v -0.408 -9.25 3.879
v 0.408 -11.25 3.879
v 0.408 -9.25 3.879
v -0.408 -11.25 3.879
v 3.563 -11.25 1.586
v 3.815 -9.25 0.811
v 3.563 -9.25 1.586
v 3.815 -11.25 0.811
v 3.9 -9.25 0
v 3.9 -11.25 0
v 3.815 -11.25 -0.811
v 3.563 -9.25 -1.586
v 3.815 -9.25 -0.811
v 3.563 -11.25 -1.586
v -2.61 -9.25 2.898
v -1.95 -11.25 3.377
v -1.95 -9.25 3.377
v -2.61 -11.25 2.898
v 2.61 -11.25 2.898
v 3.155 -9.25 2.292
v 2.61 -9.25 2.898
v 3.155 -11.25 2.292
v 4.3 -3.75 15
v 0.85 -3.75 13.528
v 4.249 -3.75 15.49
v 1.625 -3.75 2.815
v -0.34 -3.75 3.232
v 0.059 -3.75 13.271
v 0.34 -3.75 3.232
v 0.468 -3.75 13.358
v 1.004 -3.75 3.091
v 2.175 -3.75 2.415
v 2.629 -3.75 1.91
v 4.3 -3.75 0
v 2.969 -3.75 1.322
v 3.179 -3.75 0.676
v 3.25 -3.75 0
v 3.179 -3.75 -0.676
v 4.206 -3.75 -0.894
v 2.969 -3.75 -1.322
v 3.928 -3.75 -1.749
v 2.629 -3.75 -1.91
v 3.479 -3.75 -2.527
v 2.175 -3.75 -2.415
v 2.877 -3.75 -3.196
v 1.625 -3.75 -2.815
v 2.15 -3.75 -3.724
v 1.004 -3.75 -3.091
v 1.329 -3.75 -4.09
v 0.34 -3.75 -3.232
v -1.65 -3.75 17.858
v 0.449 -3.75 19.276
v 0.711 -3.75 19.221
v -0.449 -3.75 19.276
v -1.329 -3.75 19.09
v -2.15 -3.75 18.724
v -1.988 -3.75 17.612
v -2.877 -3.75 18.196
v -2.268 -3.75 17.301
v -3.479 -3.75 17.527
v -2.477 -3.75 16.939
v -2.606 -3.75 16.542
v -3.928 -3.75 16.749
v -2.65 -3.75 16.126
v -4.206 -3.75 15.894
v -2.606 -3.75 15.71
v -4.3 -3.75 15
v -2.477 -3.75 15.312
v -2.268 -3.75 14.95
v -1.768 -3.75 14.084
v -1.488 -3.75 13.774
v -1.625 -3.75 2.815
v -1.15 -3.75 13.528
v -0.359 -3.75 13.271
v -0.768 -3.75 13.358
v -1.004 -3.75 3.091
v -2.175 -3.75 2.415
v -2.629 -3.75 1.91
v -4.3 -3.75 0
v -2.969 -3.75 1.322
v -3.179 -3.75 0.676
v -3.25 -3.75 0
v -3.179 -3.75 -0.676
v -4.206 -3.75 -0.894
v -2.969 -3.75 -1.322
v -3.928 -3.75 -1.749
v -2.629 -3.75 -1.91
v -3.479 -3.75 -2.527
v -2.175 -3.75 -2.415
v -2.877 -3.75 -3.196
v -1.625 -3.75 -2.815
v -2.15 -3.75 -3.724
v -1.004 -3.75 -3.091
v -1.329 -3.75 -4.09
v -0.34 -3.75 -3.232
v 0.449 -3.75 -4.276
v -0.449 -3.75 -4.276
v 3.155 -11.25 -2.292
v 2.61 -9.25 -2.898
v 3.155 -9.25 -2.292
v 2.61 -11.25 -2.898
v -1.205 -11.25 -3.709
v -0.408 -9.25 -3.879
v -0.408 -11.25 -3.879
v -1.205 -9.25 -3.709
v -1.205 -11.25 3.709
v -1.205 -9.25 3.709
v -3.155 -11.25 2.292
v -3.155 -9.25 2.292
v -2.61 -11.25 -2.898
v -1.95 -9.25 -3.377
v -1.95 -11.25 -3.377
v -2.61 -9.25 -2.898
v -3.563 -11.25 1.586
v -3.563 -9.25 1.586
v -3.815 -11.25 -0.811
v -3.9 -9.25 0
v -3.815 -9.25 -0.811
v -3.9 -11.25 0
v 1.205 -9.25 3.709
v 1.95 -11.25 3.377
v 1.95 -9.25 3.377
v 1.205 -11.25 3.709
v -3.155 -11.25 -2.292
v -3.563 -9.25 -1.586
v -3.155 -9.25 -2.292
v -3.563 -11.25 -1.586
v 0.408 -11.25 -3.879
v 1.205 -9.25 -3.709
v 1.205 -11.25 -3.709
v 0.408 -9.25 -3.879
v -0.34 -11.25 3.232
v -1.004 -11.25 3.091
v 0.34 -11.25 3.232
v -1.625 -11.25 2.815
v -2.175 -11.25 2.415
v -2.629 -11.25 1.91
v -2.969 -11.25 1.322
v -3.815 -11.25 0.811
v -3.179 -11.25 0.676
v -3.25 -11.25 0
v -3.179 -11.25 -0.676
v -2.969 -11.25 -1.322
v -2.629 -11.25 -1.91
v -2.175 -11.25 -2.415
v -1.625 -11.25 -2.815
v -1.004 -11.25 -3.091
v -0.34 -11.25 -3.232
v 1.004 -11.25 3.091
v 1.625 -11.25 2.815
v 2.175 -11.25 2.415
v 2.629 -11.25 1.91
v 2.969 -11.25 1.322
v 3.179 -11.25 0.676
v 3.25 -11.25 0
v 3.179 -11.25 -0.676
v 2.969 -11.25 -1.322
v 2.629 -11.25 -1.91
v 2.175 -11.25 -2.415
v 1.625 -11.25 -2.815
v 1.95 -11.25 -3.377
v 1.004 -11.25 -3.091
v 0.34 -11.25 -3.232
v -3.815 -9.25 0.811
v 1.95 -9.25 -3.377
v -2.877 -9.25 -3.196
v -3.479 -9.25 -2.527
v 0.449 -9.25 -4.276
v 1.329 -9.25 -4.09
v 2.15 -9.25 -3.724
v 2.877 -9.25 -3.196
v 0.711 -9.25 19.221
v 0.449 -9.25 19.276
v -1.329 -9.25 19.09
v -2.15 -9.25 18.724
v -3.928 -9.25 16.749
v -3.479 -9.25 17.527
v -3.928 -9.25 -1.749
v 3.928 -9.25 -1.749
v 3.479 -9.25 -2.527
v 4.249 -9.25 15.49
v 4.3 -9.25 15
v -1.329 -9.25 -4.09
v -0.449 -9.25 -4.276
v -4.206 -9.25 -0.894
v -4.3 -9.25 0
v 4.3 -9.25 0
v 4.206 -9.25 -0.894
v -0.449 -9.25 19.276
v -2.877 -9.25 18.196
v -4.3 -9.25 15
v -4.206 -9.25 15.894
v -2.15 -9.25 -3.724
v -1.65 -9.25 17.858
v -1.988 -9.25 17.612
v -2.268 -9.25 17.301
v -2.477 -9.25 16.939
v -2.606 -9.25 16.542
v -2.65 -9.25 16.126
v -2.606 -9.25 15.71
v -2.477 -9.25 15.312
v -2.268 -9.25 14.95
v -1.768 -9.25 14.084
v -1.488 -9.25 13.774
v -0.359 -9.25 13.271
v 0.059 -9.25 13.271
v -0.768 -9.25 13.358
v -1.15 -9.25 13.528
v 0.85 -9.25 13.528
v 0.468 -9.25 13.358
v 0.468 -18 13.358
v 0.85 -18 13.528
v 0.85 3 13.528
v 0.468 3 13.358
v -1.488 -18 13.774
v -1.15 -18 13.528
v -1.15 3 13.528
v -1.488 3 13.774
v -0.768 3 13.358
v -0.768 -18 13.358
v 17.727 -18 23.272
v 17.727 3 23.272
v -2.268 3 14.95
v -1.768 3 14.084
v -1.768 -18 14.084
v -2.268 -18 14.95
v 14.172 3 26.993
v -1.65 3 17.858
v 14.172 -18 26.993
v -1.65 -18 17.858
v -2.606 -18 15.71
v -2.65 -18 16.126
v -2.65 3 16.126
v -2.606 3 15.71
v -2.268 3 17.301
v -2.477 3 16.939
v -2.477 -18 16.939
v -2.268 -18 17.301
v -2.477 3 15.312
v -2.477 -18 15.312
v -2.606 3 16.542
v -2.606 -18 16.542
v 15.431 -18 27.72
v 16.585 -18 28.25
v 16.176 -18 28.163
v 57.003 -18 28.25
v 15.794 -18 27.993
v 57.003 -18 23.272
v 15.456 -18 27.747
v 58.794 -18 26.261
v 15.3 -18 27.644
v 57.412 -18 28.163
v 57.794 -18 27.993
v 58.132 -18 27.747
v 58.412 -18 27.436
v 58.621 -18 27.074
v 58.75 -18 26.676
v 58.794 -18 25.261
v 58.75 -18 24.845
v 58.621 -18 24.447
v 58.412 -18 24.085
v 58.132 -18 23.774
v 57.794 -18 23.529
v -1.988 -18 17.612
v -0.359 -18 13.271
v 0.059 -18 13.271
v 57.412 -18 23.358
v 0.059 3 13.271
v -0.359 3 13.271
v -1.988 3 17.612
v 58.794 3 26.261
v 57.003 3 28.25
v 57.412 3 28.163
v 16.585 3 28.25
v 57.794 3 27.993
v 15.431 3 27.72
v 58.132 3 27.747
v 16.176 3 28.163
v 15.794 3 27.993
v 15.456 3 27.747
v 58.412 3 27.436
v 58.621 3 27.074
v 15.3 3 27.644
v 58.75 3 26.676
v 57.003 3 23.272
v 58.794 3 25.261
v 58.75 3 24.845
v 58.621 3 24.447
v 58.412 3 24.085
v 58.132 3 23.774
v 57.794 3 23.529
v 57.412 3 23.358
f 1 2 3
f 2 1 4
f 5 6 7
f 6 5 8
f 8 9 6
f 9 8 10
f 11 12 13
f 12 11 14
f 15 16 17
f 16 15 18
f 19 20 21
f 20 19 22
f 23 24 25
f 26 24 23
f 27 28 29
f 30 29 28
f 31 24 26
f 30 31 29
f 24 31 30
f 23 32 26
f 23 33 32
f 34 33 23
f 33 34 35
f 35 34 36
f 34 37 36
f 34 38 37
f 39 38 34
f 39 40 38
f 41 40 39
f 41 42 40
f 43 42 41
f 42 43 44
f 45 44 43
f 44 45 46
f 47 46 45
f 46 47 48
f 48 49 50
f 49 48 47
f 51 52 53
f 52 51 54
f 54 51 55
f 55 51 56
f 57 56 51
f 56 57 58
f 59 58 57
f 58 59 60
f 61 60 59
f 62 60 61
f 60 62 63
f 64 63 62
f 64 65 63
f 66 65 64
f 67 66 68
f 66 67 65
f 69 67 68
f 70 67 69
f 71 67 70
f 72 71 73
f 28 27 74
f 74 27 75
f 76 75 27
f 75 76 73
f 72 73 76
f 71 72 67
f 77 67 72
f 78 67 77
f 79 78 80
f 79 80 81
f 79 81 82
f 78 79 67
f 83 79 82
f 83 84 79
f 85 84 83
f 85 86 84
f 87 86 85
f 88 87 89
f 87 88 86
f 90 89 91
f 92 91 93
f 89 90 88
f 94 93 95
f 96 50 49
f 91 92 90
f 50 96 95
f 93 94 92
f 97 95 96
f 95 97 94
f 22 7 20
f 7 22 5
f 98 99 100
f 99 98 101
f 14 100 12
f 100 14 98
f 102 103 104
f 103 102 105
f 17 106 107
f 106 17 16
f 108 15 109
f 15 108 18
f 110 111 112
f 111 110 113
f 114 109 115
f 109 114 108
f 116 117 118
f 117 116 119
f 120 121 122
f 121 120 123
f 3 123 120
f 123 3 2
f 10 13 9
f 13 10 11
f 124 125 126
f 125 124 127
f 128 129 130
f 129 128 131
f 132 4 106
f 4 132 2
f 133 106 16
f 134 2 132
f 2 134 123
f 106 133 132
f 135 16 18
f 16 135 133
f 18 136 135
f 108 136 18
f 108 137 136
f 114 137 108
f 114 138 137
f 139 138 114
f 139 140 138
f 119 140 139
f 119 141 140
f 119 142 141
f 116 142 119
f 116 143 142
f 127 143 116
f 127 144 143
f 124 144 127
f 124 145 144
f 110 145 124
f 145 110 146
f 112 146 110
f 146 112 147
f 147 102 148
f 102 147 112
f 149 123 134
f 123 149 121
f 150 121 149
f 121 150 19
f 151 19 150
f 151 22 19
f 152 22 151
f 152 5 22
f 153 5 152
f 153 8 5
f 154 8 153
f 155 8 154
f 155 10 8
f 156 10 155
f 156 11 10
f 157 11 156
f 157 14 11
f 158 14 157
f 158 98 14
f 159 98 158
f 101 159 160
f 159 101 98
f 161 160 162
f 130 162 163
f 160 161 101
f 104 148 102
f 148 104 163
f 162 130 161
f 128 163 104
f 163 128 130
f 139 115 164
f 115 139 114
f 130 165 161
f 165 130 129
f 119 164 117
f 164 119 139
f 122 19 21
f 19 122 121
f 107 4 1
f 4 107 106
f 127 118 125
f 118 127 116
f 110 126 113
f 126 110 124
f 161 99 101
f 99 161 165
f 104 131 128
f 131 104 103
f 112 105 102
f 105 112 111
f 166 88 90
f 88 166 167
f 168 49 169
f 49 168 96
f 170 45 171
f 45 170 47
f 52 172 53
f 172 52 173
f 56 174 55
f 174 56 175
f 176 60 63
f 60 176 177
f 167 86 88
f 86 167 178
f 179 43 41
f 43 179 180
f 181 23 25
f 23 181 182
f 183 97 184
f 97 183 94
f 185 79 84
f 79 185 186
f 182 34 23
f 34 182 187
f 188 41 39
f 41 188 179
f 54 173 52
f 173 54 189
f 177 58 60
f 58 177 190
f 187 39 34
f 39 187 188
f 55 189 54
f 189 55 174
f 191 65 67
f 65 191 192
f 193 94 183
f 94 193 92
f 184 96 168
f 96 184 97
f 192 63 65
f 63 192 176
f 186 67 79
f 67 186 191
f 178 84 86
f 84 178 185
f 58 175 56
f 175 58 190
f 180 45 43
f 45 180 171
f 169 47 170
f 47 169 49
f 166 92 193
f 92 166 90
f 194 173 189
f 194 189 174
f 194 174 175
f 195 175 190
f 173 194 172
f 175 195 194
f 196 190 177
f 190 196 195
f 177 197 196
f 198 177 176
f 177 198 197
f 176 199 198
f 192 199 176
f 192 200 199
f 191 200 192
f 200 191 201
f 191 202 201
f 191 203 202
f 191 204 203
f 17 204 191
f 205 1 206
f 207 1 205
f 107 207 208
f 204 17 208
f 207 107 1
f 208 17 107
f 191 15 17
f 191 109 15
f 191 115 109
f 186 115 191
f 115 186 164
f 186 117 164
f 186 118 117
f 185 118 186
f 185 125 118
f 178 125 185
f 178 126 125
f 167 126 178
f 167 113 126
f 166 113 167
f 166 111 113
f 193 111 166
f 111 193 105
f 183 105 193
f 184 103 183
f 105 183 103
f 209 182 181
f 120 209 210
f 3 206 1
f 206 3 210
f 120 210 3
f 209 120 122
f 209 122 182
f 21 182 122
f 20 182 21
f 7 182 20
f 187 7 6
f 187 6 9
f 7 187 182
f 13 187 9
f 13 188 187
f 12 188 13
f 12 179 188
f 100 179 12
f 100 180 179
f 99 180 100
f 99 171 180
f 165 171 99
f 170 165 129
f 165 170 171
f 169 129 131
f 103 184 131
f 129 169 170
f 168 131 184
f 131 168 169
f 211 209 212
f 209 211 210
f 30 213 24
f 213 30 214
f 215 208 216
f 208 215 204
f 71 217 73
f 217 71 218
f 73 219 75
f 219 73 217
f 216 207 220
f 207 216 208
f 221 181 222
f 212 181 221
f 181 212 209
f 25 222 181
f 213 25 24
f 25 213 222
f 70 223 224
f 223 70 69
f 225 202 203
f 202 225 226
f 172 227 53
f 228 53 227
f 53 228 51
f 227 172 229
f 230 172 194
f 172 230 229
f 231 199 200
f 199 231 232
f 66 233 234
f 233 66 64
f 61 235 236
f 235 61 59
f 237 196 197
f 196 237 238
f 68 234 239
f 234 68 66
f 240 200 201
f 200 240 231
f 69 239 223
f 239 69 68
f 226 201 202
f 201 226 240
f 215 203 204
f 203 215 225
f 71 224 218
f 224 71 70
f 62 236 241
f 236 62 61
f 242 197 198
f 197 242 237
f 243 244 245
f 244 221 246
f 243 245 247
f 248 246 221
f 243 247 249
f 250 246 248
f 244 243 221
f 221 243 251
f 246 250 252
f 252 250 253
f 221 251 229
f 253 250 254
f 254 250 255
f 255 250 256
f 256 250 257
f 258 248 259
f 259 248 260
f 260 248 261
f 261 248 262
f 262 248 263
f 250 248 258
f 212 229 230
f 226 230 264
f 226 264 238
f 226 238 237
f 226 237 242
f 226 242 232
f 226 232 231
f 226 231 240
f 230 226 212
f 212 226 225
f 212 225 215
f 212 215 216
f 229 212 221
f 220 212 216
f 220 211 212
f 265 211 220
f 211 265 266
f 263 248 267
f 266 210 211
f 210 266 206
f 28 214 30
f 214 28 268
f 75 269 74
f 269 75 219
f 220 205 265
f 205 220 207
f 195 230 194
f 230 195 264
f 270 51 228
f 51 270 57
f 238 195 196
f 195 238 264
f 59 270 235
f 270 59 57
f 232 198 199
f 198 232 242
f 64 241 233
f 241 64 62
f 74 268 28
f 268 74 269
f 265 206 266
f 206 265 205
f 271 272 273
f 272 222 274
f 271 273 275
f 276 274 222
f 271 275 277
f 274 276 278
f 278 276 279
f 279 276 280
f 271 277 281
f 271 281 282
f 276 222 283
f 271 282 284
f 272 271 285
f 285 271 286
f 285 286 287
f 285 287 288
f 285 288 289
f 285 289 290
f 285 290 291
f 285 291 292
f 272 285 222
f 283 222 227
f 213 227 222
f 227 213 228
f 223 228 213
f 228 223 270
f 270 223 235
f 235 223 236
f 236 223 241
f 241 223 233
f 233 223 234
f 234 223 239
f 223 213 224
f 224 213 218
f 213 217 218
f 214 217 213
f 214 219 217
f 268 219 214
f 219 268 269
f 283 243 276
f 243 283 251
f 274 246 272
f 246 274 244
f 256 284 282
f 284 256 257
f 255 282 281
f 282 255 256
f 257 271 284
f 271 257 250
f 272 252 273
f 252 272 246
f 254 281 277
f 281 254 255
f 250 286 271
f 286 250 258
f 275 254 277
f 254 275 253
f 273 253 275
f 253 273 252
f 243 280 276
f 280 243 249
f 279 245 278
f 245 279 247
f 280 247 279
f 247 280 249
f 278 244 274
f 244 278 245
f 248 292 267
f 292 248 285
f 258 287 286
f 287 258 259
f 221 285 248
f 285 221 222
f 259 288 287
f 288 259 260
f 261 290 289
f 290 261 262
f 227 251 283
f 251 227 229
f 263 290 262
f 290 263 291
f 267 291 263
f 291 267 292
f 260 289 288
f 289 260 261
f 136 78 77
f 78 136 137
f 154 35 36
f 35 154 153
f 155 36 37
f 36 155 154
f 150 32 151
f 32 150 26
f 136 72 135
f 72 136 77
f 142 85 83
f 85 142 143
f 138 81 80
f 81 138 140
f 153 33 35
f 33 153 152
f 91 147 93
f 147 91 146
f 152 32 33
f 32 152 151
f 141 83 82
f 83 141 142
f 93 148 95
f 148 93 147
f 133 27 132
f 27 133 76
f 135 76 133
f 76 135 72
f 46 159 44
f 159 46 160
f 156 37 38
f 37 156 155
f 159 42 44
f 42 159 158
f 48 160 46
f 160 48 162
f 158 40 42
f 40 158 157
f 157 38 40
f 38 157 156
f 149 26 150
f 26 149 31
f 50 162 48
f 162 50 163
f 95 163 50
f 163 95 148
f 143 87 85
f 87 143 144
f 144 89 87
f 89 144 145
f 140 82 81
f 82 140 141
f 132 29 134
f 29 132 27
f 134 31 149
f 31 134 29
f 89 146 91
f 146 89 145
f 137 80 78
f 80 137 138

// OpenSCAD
// file: ../parameters.scad
maximum_printable_size = 150;

layer_thickness = 0.3;
global_clearance = 0.5;


//Screw diameter and nut for M10 [mm]
M10_screw_diameter = 10.4;
M10_head_height = 10;
M10_head_diameter = 16+0.5;
M10_nut_height = 10.5;
M10_nut_diameter = 25.5;
M10_nut_pocket = 22.3;

//Screw diameter for M8 [mm]
M8_screw_diameter = 8.6;
M8_head_height = 8;
M8_head_diameter = 13.5;
M8_nut_height = 7.5;
M8_square_nut_thin_height = 4.5;
M8_nut_diameter = 14.4 + 0.5;
M8_nut_pocket = 13 + 0.5;
M8_washer_diameter = 16;
M8_washer_thickness = 1.5;


//Screw diameter and nut for M6 [mm]
M6_screw_diameter=6.5;
M6_head_diameter = 10+0.5;
M6_head_height = 6;
M6_nut_height = 4.9;
M6_nut_diameter = 11.8;
M6_nut_pocket = 10.4;
M6_square_nut_height = 3;
M6_square_nut_diameter = 10;
M6_washer_thickness = 1.6;

//Screw diameter and nut for M5 [mm]
M5_screw_diameter=5.5;
M5_head_height = 5;
M5_head_diameter = 13+0.5;
M5_nut_height = 4.5;
M5_nut_diameter = 9.4;
M5_nut_pocket = 8.4;

//Screw diameter and nut for M4 [mm]
M4_screw_diameter=4.5;
M4_screw_head_height = 4;
M4_nut_height = 3.2;
M4_nut_diameter = 8.4;
M4_nut_pocket = 7.5;

//Screw diameter and nut for M3 [mm]
M3_screw_diameter = 3.2;
M3_nut_height = 2.7;
M3_nut_diameter = 6.6;
M3_nut_pocket = 5.6;
M3_screw_head_height = 3;

//Screw diameter and nut for M2,5 [mm]
M2_5_screw_diameter = 2.7;
M2_5_nut_height = 2.3;
M2_5_nut_diameter = 6;
M2_5_nut_pocket = 5.5;

// kulove lozisko

bearing_efsm_08_h = 33+1;
bearing_efsm_08_m = 22;
bearing_efsm_08_db = 18;
bearing_efsm_08_ag = 10.5;
bearing_efsm_08_n = M4_screw_diameter;
bearing_efsm_08_a1 = 5.5;
bearing_efsm_08_d = 8.25;
bearing_efsm_08_B = 8; // ball height

bearing_efsm_10_h = 38+1;
bearing_efsm_10_m = 26;
bearing_efsm_10_db = 21.9;
bearing_efsm_10_ag = 12+0.2;
bearing_efsm_10_n = M5_screw_diameter;
bearing_efsm_10_a1 = 6.5;
bearing_efsm_10_d = 10.25;


bearing_efsm_12_width = 40+1;
bearing_efsm_12_h = bearing_efsm_12_width;
bearing_efsm_12_boltd = 28/2; // polovina vzdalenosti mezi srouby
bearing_efsm_12_m = bearing_efsm_12_boltd*2;
bearing_efsm_12_db = 25;
bearing_efsm_12_ag = 13;
bearing_efsm_12_a1 = 7;
bearing_efsm_12_n = M5_screw_diameter;
bearing_efsm_12_d = 12.15;
bearing_efsm_12_B = 10; // ball height
bearing_efsm_space = 1;

bearing_efsm_17_width = 54+1;
bearing_efsm_17_h = bearing_efsm_17_width;
bearing_efsm_17_boltd = 38/2; // polovina vzdalenosti mezi srouby
bearing_efsm_17_m = bearing_efsm_17_boltd*2;
bearing_efsm_17_db = 35;
bearing_efsm_17_ag = 18;
bearing_efsm_17_n = M6_screw_diameter;
bearing_efsm_17_a1 = 10;
bearing_efsm_17_B = 17; // ball height

//limcove lozisko
bearing_EFOM_10_L=26; //celkova sirka zakladny
bearing_EFOM_10_d1=10.3;//diametr otvoru real=10 mm
bearing_EFOM_10_dB=22;//diametr vystupku pro ulozeni lozika
bearing_EFOM_10_H=52;//celková delka zakladny
bearing_EFOM_10_J=36;// hole pitch
bearing_EFOM_10_A1=6.5;//vyska pouzdra
bearing_EFOM_10_Ag=12;//celkova vyska
bearing_EFOM_10_N1=5;//sirka otvoru pro sroub
bearing_EFOM_10_N2=8;//delka otvoru pro sroub
bearing_EFOM_10_m=36;//roztec der pro sroub
bearing_EFOM_10_h=9;//vyska lozika


608_bearing_outer_diameter = 22.3;
608_bearing_inner_diameter = 16;
608_bearing_thickness = 7.1;


// 20 KG servo parameters

servo_20kg_axis_offset = 9.375; // jak je osa mimo stredu
servo_20kg_body_x = 42;
servo_20kg_body_y = 21;
servo_20kg_body_z = 40;
servo_20kg_thread_x = 49/2;
servo_20kg_thread_y = 10/2;
servo_20kg_body_below = 10; // jak hluboko je tělo serva pod drzaky na srouby
servo_20kg_below = 25.8; // jak hluboko je páka serva pod drzaky na srouby

servo_20kg_bolt_d = 2.5+0.3;
servo_20kg_nut_d = 5+0.3;


//strain gauge
strain_gauge_width = 12.7;
strain_gauge_length = 75.1;
strain_gauge_screw_distance = 10;

//ALU profile
ALU_profile_width = 30.5;
ALU_profile_holder_wall_thickness = 3;
ALU_profile_groove_width = 8;

//pillow block bearing
//https://www.igus.eu/product/372
//Part no. KSTM-08
KSTM08_screws_distance = 33;         //m
KSTM08_screws_holes_diameter = 4.5;  //d2
KSTM08_flange_thickness = 6;         //h3
KSTM08_case_width = 9;               //C1
KSTM08_case_length = 47;             //a
KSTM08_ball_width = 12;              //B
KSTM08_ball_hole_diameter = 7.85;    //d1


//ložiska pro malý rotor
bearing_outer_diameter = 10.2;    // Rozměr B1 v nákresu s přídavkem na toleranci otvoru
bearing_thickness = 4;        // Rozměr B2 v nákresu
//bearing_shaft_length = 19.5;    // Rozměr B3 v nákresu, Originalni hodnota 19.5
bearing_shaft_length = 20;    // Rozměr B3 v nákresu


//simple platform parameters ////////////////////////////////////////////
front_holder_width = 160;
front_holder_angle = 25;
front_holder_height = 60;
front_holder_offset = 15;
front_holder_height_offset = 75;

// lock moving servo parameters
// static par.
servo_length = 23.1;
servo_width = 12.1;
servo_height = 26.7;
servo_axle_offset = 2.5;
servo_axle_height = 5;
servo_movement_angle = 40;
servo_movement_angle_offset = -10; // angle offset up
servo_force = 0.5; // [N/m] torque of servo

// dynamic par.
servo_arm_length = servo_width/2+ALU_profile_width/2+ALU_profile_holder_wall_thickness;
servo_travel_y = cos(servo_movement_angle)*servo_arm_length;
servo_arm_hole_length = (servo_arm_length/cos(servo_movement_angle+servo_movement_angle_offset))-servo_arm_length;
servo_joint_offset = sin(servo_movement_angle+servo_movement_angle_offset)*(servo_arm_length+servo_arm_hole_length+5);
servo_joint_offset_by_angle = -tan(servo_movement_angle_offset)*servo_arm_length;
servo_max_linear_force = servo_force/(servo_arm_length/1000); // max servo linear force [N]
servo_min_linear_force = cos(servo_movement_angle+abs(servo_movement_angle_offset))*servo_max_linear_force; // min servo linear force [N] in the most extreme position
servo_holding_linear_force = cos(servo_movement_angle+servo_movement_angle_offset)*servo_max_linear_force; // min servo linear force [N] in holding position

// lock static parameters
lock_screws_dia = 3.1;
lock_depth = 20;
lock_axle_diameter = 15;
lock_grab_axle_dia = 13;
lock_arms_joint_offset = 30;
lock_arms_joint_angle = 55;

// lock dynamic parameters
lock_push_force = (servo_holding_linear_force/cos(lock_arms_joint_angle))/cos(lock_arms_joint_angle); // lock arm pushing force on linear servo joint
lock_push_arm_length = tan(lock_arms_joint_angle)*lock_arms_joint_offset;
lock_arm_force_ratio = 1; // lock arm change holding force ratio (0.5 = arm will have half holding force)
lock_hold_arm_length = lock_push_arm_length/lock_arm_force_ratio;
lock_holding_force = lock_push_force*lock_arm_force_ratio;
lock_joint_arm_length = sqrt(pow(lock_push_arm_length, 2)+pow(lock_arms_joint_offset, 2));
// main file
include <../parameters.scad>


module 888_1011() {
	difference() {
		union() {
			translate([0, -7.5/2, 0])
			union() {
				rotate([90, 0, 0])
				cylinder(d=7.8, h=7.5, $fn=30);

				hull() {
					rotate([90, 0, 0])
					cylinder(d=M8_screw_diameter, h=5.5, $fn=30);
		
					translate([0, 0, 15])
					rotate([90, 0, 0])
					cylinder(d=M8_screw_diameter, h=5.5, $fn=30);
				}
			}
			
			minkowski() {
				union() {
					translate([0, 0, 15])
					rotate([0, -30, 0])
					translate([0, -15, 0.3])
					cube([20, 1, 1]);

					translate([cos(20)*20-2, -15, sin(20)*30+15])
					cube([40, 1, 1]);
				}
	

				translate([0, 20-3, 0])
				rotate([90, 0, 0])
				cylinder(d=4, h=20, $fn=30);
			}
		}

		rotate([90, 0, 0])
		translate([0, 0, -1])
		cylinder(d=M6_screw_diameter, h=17, $fn=30);
	}
}

888_1011();
